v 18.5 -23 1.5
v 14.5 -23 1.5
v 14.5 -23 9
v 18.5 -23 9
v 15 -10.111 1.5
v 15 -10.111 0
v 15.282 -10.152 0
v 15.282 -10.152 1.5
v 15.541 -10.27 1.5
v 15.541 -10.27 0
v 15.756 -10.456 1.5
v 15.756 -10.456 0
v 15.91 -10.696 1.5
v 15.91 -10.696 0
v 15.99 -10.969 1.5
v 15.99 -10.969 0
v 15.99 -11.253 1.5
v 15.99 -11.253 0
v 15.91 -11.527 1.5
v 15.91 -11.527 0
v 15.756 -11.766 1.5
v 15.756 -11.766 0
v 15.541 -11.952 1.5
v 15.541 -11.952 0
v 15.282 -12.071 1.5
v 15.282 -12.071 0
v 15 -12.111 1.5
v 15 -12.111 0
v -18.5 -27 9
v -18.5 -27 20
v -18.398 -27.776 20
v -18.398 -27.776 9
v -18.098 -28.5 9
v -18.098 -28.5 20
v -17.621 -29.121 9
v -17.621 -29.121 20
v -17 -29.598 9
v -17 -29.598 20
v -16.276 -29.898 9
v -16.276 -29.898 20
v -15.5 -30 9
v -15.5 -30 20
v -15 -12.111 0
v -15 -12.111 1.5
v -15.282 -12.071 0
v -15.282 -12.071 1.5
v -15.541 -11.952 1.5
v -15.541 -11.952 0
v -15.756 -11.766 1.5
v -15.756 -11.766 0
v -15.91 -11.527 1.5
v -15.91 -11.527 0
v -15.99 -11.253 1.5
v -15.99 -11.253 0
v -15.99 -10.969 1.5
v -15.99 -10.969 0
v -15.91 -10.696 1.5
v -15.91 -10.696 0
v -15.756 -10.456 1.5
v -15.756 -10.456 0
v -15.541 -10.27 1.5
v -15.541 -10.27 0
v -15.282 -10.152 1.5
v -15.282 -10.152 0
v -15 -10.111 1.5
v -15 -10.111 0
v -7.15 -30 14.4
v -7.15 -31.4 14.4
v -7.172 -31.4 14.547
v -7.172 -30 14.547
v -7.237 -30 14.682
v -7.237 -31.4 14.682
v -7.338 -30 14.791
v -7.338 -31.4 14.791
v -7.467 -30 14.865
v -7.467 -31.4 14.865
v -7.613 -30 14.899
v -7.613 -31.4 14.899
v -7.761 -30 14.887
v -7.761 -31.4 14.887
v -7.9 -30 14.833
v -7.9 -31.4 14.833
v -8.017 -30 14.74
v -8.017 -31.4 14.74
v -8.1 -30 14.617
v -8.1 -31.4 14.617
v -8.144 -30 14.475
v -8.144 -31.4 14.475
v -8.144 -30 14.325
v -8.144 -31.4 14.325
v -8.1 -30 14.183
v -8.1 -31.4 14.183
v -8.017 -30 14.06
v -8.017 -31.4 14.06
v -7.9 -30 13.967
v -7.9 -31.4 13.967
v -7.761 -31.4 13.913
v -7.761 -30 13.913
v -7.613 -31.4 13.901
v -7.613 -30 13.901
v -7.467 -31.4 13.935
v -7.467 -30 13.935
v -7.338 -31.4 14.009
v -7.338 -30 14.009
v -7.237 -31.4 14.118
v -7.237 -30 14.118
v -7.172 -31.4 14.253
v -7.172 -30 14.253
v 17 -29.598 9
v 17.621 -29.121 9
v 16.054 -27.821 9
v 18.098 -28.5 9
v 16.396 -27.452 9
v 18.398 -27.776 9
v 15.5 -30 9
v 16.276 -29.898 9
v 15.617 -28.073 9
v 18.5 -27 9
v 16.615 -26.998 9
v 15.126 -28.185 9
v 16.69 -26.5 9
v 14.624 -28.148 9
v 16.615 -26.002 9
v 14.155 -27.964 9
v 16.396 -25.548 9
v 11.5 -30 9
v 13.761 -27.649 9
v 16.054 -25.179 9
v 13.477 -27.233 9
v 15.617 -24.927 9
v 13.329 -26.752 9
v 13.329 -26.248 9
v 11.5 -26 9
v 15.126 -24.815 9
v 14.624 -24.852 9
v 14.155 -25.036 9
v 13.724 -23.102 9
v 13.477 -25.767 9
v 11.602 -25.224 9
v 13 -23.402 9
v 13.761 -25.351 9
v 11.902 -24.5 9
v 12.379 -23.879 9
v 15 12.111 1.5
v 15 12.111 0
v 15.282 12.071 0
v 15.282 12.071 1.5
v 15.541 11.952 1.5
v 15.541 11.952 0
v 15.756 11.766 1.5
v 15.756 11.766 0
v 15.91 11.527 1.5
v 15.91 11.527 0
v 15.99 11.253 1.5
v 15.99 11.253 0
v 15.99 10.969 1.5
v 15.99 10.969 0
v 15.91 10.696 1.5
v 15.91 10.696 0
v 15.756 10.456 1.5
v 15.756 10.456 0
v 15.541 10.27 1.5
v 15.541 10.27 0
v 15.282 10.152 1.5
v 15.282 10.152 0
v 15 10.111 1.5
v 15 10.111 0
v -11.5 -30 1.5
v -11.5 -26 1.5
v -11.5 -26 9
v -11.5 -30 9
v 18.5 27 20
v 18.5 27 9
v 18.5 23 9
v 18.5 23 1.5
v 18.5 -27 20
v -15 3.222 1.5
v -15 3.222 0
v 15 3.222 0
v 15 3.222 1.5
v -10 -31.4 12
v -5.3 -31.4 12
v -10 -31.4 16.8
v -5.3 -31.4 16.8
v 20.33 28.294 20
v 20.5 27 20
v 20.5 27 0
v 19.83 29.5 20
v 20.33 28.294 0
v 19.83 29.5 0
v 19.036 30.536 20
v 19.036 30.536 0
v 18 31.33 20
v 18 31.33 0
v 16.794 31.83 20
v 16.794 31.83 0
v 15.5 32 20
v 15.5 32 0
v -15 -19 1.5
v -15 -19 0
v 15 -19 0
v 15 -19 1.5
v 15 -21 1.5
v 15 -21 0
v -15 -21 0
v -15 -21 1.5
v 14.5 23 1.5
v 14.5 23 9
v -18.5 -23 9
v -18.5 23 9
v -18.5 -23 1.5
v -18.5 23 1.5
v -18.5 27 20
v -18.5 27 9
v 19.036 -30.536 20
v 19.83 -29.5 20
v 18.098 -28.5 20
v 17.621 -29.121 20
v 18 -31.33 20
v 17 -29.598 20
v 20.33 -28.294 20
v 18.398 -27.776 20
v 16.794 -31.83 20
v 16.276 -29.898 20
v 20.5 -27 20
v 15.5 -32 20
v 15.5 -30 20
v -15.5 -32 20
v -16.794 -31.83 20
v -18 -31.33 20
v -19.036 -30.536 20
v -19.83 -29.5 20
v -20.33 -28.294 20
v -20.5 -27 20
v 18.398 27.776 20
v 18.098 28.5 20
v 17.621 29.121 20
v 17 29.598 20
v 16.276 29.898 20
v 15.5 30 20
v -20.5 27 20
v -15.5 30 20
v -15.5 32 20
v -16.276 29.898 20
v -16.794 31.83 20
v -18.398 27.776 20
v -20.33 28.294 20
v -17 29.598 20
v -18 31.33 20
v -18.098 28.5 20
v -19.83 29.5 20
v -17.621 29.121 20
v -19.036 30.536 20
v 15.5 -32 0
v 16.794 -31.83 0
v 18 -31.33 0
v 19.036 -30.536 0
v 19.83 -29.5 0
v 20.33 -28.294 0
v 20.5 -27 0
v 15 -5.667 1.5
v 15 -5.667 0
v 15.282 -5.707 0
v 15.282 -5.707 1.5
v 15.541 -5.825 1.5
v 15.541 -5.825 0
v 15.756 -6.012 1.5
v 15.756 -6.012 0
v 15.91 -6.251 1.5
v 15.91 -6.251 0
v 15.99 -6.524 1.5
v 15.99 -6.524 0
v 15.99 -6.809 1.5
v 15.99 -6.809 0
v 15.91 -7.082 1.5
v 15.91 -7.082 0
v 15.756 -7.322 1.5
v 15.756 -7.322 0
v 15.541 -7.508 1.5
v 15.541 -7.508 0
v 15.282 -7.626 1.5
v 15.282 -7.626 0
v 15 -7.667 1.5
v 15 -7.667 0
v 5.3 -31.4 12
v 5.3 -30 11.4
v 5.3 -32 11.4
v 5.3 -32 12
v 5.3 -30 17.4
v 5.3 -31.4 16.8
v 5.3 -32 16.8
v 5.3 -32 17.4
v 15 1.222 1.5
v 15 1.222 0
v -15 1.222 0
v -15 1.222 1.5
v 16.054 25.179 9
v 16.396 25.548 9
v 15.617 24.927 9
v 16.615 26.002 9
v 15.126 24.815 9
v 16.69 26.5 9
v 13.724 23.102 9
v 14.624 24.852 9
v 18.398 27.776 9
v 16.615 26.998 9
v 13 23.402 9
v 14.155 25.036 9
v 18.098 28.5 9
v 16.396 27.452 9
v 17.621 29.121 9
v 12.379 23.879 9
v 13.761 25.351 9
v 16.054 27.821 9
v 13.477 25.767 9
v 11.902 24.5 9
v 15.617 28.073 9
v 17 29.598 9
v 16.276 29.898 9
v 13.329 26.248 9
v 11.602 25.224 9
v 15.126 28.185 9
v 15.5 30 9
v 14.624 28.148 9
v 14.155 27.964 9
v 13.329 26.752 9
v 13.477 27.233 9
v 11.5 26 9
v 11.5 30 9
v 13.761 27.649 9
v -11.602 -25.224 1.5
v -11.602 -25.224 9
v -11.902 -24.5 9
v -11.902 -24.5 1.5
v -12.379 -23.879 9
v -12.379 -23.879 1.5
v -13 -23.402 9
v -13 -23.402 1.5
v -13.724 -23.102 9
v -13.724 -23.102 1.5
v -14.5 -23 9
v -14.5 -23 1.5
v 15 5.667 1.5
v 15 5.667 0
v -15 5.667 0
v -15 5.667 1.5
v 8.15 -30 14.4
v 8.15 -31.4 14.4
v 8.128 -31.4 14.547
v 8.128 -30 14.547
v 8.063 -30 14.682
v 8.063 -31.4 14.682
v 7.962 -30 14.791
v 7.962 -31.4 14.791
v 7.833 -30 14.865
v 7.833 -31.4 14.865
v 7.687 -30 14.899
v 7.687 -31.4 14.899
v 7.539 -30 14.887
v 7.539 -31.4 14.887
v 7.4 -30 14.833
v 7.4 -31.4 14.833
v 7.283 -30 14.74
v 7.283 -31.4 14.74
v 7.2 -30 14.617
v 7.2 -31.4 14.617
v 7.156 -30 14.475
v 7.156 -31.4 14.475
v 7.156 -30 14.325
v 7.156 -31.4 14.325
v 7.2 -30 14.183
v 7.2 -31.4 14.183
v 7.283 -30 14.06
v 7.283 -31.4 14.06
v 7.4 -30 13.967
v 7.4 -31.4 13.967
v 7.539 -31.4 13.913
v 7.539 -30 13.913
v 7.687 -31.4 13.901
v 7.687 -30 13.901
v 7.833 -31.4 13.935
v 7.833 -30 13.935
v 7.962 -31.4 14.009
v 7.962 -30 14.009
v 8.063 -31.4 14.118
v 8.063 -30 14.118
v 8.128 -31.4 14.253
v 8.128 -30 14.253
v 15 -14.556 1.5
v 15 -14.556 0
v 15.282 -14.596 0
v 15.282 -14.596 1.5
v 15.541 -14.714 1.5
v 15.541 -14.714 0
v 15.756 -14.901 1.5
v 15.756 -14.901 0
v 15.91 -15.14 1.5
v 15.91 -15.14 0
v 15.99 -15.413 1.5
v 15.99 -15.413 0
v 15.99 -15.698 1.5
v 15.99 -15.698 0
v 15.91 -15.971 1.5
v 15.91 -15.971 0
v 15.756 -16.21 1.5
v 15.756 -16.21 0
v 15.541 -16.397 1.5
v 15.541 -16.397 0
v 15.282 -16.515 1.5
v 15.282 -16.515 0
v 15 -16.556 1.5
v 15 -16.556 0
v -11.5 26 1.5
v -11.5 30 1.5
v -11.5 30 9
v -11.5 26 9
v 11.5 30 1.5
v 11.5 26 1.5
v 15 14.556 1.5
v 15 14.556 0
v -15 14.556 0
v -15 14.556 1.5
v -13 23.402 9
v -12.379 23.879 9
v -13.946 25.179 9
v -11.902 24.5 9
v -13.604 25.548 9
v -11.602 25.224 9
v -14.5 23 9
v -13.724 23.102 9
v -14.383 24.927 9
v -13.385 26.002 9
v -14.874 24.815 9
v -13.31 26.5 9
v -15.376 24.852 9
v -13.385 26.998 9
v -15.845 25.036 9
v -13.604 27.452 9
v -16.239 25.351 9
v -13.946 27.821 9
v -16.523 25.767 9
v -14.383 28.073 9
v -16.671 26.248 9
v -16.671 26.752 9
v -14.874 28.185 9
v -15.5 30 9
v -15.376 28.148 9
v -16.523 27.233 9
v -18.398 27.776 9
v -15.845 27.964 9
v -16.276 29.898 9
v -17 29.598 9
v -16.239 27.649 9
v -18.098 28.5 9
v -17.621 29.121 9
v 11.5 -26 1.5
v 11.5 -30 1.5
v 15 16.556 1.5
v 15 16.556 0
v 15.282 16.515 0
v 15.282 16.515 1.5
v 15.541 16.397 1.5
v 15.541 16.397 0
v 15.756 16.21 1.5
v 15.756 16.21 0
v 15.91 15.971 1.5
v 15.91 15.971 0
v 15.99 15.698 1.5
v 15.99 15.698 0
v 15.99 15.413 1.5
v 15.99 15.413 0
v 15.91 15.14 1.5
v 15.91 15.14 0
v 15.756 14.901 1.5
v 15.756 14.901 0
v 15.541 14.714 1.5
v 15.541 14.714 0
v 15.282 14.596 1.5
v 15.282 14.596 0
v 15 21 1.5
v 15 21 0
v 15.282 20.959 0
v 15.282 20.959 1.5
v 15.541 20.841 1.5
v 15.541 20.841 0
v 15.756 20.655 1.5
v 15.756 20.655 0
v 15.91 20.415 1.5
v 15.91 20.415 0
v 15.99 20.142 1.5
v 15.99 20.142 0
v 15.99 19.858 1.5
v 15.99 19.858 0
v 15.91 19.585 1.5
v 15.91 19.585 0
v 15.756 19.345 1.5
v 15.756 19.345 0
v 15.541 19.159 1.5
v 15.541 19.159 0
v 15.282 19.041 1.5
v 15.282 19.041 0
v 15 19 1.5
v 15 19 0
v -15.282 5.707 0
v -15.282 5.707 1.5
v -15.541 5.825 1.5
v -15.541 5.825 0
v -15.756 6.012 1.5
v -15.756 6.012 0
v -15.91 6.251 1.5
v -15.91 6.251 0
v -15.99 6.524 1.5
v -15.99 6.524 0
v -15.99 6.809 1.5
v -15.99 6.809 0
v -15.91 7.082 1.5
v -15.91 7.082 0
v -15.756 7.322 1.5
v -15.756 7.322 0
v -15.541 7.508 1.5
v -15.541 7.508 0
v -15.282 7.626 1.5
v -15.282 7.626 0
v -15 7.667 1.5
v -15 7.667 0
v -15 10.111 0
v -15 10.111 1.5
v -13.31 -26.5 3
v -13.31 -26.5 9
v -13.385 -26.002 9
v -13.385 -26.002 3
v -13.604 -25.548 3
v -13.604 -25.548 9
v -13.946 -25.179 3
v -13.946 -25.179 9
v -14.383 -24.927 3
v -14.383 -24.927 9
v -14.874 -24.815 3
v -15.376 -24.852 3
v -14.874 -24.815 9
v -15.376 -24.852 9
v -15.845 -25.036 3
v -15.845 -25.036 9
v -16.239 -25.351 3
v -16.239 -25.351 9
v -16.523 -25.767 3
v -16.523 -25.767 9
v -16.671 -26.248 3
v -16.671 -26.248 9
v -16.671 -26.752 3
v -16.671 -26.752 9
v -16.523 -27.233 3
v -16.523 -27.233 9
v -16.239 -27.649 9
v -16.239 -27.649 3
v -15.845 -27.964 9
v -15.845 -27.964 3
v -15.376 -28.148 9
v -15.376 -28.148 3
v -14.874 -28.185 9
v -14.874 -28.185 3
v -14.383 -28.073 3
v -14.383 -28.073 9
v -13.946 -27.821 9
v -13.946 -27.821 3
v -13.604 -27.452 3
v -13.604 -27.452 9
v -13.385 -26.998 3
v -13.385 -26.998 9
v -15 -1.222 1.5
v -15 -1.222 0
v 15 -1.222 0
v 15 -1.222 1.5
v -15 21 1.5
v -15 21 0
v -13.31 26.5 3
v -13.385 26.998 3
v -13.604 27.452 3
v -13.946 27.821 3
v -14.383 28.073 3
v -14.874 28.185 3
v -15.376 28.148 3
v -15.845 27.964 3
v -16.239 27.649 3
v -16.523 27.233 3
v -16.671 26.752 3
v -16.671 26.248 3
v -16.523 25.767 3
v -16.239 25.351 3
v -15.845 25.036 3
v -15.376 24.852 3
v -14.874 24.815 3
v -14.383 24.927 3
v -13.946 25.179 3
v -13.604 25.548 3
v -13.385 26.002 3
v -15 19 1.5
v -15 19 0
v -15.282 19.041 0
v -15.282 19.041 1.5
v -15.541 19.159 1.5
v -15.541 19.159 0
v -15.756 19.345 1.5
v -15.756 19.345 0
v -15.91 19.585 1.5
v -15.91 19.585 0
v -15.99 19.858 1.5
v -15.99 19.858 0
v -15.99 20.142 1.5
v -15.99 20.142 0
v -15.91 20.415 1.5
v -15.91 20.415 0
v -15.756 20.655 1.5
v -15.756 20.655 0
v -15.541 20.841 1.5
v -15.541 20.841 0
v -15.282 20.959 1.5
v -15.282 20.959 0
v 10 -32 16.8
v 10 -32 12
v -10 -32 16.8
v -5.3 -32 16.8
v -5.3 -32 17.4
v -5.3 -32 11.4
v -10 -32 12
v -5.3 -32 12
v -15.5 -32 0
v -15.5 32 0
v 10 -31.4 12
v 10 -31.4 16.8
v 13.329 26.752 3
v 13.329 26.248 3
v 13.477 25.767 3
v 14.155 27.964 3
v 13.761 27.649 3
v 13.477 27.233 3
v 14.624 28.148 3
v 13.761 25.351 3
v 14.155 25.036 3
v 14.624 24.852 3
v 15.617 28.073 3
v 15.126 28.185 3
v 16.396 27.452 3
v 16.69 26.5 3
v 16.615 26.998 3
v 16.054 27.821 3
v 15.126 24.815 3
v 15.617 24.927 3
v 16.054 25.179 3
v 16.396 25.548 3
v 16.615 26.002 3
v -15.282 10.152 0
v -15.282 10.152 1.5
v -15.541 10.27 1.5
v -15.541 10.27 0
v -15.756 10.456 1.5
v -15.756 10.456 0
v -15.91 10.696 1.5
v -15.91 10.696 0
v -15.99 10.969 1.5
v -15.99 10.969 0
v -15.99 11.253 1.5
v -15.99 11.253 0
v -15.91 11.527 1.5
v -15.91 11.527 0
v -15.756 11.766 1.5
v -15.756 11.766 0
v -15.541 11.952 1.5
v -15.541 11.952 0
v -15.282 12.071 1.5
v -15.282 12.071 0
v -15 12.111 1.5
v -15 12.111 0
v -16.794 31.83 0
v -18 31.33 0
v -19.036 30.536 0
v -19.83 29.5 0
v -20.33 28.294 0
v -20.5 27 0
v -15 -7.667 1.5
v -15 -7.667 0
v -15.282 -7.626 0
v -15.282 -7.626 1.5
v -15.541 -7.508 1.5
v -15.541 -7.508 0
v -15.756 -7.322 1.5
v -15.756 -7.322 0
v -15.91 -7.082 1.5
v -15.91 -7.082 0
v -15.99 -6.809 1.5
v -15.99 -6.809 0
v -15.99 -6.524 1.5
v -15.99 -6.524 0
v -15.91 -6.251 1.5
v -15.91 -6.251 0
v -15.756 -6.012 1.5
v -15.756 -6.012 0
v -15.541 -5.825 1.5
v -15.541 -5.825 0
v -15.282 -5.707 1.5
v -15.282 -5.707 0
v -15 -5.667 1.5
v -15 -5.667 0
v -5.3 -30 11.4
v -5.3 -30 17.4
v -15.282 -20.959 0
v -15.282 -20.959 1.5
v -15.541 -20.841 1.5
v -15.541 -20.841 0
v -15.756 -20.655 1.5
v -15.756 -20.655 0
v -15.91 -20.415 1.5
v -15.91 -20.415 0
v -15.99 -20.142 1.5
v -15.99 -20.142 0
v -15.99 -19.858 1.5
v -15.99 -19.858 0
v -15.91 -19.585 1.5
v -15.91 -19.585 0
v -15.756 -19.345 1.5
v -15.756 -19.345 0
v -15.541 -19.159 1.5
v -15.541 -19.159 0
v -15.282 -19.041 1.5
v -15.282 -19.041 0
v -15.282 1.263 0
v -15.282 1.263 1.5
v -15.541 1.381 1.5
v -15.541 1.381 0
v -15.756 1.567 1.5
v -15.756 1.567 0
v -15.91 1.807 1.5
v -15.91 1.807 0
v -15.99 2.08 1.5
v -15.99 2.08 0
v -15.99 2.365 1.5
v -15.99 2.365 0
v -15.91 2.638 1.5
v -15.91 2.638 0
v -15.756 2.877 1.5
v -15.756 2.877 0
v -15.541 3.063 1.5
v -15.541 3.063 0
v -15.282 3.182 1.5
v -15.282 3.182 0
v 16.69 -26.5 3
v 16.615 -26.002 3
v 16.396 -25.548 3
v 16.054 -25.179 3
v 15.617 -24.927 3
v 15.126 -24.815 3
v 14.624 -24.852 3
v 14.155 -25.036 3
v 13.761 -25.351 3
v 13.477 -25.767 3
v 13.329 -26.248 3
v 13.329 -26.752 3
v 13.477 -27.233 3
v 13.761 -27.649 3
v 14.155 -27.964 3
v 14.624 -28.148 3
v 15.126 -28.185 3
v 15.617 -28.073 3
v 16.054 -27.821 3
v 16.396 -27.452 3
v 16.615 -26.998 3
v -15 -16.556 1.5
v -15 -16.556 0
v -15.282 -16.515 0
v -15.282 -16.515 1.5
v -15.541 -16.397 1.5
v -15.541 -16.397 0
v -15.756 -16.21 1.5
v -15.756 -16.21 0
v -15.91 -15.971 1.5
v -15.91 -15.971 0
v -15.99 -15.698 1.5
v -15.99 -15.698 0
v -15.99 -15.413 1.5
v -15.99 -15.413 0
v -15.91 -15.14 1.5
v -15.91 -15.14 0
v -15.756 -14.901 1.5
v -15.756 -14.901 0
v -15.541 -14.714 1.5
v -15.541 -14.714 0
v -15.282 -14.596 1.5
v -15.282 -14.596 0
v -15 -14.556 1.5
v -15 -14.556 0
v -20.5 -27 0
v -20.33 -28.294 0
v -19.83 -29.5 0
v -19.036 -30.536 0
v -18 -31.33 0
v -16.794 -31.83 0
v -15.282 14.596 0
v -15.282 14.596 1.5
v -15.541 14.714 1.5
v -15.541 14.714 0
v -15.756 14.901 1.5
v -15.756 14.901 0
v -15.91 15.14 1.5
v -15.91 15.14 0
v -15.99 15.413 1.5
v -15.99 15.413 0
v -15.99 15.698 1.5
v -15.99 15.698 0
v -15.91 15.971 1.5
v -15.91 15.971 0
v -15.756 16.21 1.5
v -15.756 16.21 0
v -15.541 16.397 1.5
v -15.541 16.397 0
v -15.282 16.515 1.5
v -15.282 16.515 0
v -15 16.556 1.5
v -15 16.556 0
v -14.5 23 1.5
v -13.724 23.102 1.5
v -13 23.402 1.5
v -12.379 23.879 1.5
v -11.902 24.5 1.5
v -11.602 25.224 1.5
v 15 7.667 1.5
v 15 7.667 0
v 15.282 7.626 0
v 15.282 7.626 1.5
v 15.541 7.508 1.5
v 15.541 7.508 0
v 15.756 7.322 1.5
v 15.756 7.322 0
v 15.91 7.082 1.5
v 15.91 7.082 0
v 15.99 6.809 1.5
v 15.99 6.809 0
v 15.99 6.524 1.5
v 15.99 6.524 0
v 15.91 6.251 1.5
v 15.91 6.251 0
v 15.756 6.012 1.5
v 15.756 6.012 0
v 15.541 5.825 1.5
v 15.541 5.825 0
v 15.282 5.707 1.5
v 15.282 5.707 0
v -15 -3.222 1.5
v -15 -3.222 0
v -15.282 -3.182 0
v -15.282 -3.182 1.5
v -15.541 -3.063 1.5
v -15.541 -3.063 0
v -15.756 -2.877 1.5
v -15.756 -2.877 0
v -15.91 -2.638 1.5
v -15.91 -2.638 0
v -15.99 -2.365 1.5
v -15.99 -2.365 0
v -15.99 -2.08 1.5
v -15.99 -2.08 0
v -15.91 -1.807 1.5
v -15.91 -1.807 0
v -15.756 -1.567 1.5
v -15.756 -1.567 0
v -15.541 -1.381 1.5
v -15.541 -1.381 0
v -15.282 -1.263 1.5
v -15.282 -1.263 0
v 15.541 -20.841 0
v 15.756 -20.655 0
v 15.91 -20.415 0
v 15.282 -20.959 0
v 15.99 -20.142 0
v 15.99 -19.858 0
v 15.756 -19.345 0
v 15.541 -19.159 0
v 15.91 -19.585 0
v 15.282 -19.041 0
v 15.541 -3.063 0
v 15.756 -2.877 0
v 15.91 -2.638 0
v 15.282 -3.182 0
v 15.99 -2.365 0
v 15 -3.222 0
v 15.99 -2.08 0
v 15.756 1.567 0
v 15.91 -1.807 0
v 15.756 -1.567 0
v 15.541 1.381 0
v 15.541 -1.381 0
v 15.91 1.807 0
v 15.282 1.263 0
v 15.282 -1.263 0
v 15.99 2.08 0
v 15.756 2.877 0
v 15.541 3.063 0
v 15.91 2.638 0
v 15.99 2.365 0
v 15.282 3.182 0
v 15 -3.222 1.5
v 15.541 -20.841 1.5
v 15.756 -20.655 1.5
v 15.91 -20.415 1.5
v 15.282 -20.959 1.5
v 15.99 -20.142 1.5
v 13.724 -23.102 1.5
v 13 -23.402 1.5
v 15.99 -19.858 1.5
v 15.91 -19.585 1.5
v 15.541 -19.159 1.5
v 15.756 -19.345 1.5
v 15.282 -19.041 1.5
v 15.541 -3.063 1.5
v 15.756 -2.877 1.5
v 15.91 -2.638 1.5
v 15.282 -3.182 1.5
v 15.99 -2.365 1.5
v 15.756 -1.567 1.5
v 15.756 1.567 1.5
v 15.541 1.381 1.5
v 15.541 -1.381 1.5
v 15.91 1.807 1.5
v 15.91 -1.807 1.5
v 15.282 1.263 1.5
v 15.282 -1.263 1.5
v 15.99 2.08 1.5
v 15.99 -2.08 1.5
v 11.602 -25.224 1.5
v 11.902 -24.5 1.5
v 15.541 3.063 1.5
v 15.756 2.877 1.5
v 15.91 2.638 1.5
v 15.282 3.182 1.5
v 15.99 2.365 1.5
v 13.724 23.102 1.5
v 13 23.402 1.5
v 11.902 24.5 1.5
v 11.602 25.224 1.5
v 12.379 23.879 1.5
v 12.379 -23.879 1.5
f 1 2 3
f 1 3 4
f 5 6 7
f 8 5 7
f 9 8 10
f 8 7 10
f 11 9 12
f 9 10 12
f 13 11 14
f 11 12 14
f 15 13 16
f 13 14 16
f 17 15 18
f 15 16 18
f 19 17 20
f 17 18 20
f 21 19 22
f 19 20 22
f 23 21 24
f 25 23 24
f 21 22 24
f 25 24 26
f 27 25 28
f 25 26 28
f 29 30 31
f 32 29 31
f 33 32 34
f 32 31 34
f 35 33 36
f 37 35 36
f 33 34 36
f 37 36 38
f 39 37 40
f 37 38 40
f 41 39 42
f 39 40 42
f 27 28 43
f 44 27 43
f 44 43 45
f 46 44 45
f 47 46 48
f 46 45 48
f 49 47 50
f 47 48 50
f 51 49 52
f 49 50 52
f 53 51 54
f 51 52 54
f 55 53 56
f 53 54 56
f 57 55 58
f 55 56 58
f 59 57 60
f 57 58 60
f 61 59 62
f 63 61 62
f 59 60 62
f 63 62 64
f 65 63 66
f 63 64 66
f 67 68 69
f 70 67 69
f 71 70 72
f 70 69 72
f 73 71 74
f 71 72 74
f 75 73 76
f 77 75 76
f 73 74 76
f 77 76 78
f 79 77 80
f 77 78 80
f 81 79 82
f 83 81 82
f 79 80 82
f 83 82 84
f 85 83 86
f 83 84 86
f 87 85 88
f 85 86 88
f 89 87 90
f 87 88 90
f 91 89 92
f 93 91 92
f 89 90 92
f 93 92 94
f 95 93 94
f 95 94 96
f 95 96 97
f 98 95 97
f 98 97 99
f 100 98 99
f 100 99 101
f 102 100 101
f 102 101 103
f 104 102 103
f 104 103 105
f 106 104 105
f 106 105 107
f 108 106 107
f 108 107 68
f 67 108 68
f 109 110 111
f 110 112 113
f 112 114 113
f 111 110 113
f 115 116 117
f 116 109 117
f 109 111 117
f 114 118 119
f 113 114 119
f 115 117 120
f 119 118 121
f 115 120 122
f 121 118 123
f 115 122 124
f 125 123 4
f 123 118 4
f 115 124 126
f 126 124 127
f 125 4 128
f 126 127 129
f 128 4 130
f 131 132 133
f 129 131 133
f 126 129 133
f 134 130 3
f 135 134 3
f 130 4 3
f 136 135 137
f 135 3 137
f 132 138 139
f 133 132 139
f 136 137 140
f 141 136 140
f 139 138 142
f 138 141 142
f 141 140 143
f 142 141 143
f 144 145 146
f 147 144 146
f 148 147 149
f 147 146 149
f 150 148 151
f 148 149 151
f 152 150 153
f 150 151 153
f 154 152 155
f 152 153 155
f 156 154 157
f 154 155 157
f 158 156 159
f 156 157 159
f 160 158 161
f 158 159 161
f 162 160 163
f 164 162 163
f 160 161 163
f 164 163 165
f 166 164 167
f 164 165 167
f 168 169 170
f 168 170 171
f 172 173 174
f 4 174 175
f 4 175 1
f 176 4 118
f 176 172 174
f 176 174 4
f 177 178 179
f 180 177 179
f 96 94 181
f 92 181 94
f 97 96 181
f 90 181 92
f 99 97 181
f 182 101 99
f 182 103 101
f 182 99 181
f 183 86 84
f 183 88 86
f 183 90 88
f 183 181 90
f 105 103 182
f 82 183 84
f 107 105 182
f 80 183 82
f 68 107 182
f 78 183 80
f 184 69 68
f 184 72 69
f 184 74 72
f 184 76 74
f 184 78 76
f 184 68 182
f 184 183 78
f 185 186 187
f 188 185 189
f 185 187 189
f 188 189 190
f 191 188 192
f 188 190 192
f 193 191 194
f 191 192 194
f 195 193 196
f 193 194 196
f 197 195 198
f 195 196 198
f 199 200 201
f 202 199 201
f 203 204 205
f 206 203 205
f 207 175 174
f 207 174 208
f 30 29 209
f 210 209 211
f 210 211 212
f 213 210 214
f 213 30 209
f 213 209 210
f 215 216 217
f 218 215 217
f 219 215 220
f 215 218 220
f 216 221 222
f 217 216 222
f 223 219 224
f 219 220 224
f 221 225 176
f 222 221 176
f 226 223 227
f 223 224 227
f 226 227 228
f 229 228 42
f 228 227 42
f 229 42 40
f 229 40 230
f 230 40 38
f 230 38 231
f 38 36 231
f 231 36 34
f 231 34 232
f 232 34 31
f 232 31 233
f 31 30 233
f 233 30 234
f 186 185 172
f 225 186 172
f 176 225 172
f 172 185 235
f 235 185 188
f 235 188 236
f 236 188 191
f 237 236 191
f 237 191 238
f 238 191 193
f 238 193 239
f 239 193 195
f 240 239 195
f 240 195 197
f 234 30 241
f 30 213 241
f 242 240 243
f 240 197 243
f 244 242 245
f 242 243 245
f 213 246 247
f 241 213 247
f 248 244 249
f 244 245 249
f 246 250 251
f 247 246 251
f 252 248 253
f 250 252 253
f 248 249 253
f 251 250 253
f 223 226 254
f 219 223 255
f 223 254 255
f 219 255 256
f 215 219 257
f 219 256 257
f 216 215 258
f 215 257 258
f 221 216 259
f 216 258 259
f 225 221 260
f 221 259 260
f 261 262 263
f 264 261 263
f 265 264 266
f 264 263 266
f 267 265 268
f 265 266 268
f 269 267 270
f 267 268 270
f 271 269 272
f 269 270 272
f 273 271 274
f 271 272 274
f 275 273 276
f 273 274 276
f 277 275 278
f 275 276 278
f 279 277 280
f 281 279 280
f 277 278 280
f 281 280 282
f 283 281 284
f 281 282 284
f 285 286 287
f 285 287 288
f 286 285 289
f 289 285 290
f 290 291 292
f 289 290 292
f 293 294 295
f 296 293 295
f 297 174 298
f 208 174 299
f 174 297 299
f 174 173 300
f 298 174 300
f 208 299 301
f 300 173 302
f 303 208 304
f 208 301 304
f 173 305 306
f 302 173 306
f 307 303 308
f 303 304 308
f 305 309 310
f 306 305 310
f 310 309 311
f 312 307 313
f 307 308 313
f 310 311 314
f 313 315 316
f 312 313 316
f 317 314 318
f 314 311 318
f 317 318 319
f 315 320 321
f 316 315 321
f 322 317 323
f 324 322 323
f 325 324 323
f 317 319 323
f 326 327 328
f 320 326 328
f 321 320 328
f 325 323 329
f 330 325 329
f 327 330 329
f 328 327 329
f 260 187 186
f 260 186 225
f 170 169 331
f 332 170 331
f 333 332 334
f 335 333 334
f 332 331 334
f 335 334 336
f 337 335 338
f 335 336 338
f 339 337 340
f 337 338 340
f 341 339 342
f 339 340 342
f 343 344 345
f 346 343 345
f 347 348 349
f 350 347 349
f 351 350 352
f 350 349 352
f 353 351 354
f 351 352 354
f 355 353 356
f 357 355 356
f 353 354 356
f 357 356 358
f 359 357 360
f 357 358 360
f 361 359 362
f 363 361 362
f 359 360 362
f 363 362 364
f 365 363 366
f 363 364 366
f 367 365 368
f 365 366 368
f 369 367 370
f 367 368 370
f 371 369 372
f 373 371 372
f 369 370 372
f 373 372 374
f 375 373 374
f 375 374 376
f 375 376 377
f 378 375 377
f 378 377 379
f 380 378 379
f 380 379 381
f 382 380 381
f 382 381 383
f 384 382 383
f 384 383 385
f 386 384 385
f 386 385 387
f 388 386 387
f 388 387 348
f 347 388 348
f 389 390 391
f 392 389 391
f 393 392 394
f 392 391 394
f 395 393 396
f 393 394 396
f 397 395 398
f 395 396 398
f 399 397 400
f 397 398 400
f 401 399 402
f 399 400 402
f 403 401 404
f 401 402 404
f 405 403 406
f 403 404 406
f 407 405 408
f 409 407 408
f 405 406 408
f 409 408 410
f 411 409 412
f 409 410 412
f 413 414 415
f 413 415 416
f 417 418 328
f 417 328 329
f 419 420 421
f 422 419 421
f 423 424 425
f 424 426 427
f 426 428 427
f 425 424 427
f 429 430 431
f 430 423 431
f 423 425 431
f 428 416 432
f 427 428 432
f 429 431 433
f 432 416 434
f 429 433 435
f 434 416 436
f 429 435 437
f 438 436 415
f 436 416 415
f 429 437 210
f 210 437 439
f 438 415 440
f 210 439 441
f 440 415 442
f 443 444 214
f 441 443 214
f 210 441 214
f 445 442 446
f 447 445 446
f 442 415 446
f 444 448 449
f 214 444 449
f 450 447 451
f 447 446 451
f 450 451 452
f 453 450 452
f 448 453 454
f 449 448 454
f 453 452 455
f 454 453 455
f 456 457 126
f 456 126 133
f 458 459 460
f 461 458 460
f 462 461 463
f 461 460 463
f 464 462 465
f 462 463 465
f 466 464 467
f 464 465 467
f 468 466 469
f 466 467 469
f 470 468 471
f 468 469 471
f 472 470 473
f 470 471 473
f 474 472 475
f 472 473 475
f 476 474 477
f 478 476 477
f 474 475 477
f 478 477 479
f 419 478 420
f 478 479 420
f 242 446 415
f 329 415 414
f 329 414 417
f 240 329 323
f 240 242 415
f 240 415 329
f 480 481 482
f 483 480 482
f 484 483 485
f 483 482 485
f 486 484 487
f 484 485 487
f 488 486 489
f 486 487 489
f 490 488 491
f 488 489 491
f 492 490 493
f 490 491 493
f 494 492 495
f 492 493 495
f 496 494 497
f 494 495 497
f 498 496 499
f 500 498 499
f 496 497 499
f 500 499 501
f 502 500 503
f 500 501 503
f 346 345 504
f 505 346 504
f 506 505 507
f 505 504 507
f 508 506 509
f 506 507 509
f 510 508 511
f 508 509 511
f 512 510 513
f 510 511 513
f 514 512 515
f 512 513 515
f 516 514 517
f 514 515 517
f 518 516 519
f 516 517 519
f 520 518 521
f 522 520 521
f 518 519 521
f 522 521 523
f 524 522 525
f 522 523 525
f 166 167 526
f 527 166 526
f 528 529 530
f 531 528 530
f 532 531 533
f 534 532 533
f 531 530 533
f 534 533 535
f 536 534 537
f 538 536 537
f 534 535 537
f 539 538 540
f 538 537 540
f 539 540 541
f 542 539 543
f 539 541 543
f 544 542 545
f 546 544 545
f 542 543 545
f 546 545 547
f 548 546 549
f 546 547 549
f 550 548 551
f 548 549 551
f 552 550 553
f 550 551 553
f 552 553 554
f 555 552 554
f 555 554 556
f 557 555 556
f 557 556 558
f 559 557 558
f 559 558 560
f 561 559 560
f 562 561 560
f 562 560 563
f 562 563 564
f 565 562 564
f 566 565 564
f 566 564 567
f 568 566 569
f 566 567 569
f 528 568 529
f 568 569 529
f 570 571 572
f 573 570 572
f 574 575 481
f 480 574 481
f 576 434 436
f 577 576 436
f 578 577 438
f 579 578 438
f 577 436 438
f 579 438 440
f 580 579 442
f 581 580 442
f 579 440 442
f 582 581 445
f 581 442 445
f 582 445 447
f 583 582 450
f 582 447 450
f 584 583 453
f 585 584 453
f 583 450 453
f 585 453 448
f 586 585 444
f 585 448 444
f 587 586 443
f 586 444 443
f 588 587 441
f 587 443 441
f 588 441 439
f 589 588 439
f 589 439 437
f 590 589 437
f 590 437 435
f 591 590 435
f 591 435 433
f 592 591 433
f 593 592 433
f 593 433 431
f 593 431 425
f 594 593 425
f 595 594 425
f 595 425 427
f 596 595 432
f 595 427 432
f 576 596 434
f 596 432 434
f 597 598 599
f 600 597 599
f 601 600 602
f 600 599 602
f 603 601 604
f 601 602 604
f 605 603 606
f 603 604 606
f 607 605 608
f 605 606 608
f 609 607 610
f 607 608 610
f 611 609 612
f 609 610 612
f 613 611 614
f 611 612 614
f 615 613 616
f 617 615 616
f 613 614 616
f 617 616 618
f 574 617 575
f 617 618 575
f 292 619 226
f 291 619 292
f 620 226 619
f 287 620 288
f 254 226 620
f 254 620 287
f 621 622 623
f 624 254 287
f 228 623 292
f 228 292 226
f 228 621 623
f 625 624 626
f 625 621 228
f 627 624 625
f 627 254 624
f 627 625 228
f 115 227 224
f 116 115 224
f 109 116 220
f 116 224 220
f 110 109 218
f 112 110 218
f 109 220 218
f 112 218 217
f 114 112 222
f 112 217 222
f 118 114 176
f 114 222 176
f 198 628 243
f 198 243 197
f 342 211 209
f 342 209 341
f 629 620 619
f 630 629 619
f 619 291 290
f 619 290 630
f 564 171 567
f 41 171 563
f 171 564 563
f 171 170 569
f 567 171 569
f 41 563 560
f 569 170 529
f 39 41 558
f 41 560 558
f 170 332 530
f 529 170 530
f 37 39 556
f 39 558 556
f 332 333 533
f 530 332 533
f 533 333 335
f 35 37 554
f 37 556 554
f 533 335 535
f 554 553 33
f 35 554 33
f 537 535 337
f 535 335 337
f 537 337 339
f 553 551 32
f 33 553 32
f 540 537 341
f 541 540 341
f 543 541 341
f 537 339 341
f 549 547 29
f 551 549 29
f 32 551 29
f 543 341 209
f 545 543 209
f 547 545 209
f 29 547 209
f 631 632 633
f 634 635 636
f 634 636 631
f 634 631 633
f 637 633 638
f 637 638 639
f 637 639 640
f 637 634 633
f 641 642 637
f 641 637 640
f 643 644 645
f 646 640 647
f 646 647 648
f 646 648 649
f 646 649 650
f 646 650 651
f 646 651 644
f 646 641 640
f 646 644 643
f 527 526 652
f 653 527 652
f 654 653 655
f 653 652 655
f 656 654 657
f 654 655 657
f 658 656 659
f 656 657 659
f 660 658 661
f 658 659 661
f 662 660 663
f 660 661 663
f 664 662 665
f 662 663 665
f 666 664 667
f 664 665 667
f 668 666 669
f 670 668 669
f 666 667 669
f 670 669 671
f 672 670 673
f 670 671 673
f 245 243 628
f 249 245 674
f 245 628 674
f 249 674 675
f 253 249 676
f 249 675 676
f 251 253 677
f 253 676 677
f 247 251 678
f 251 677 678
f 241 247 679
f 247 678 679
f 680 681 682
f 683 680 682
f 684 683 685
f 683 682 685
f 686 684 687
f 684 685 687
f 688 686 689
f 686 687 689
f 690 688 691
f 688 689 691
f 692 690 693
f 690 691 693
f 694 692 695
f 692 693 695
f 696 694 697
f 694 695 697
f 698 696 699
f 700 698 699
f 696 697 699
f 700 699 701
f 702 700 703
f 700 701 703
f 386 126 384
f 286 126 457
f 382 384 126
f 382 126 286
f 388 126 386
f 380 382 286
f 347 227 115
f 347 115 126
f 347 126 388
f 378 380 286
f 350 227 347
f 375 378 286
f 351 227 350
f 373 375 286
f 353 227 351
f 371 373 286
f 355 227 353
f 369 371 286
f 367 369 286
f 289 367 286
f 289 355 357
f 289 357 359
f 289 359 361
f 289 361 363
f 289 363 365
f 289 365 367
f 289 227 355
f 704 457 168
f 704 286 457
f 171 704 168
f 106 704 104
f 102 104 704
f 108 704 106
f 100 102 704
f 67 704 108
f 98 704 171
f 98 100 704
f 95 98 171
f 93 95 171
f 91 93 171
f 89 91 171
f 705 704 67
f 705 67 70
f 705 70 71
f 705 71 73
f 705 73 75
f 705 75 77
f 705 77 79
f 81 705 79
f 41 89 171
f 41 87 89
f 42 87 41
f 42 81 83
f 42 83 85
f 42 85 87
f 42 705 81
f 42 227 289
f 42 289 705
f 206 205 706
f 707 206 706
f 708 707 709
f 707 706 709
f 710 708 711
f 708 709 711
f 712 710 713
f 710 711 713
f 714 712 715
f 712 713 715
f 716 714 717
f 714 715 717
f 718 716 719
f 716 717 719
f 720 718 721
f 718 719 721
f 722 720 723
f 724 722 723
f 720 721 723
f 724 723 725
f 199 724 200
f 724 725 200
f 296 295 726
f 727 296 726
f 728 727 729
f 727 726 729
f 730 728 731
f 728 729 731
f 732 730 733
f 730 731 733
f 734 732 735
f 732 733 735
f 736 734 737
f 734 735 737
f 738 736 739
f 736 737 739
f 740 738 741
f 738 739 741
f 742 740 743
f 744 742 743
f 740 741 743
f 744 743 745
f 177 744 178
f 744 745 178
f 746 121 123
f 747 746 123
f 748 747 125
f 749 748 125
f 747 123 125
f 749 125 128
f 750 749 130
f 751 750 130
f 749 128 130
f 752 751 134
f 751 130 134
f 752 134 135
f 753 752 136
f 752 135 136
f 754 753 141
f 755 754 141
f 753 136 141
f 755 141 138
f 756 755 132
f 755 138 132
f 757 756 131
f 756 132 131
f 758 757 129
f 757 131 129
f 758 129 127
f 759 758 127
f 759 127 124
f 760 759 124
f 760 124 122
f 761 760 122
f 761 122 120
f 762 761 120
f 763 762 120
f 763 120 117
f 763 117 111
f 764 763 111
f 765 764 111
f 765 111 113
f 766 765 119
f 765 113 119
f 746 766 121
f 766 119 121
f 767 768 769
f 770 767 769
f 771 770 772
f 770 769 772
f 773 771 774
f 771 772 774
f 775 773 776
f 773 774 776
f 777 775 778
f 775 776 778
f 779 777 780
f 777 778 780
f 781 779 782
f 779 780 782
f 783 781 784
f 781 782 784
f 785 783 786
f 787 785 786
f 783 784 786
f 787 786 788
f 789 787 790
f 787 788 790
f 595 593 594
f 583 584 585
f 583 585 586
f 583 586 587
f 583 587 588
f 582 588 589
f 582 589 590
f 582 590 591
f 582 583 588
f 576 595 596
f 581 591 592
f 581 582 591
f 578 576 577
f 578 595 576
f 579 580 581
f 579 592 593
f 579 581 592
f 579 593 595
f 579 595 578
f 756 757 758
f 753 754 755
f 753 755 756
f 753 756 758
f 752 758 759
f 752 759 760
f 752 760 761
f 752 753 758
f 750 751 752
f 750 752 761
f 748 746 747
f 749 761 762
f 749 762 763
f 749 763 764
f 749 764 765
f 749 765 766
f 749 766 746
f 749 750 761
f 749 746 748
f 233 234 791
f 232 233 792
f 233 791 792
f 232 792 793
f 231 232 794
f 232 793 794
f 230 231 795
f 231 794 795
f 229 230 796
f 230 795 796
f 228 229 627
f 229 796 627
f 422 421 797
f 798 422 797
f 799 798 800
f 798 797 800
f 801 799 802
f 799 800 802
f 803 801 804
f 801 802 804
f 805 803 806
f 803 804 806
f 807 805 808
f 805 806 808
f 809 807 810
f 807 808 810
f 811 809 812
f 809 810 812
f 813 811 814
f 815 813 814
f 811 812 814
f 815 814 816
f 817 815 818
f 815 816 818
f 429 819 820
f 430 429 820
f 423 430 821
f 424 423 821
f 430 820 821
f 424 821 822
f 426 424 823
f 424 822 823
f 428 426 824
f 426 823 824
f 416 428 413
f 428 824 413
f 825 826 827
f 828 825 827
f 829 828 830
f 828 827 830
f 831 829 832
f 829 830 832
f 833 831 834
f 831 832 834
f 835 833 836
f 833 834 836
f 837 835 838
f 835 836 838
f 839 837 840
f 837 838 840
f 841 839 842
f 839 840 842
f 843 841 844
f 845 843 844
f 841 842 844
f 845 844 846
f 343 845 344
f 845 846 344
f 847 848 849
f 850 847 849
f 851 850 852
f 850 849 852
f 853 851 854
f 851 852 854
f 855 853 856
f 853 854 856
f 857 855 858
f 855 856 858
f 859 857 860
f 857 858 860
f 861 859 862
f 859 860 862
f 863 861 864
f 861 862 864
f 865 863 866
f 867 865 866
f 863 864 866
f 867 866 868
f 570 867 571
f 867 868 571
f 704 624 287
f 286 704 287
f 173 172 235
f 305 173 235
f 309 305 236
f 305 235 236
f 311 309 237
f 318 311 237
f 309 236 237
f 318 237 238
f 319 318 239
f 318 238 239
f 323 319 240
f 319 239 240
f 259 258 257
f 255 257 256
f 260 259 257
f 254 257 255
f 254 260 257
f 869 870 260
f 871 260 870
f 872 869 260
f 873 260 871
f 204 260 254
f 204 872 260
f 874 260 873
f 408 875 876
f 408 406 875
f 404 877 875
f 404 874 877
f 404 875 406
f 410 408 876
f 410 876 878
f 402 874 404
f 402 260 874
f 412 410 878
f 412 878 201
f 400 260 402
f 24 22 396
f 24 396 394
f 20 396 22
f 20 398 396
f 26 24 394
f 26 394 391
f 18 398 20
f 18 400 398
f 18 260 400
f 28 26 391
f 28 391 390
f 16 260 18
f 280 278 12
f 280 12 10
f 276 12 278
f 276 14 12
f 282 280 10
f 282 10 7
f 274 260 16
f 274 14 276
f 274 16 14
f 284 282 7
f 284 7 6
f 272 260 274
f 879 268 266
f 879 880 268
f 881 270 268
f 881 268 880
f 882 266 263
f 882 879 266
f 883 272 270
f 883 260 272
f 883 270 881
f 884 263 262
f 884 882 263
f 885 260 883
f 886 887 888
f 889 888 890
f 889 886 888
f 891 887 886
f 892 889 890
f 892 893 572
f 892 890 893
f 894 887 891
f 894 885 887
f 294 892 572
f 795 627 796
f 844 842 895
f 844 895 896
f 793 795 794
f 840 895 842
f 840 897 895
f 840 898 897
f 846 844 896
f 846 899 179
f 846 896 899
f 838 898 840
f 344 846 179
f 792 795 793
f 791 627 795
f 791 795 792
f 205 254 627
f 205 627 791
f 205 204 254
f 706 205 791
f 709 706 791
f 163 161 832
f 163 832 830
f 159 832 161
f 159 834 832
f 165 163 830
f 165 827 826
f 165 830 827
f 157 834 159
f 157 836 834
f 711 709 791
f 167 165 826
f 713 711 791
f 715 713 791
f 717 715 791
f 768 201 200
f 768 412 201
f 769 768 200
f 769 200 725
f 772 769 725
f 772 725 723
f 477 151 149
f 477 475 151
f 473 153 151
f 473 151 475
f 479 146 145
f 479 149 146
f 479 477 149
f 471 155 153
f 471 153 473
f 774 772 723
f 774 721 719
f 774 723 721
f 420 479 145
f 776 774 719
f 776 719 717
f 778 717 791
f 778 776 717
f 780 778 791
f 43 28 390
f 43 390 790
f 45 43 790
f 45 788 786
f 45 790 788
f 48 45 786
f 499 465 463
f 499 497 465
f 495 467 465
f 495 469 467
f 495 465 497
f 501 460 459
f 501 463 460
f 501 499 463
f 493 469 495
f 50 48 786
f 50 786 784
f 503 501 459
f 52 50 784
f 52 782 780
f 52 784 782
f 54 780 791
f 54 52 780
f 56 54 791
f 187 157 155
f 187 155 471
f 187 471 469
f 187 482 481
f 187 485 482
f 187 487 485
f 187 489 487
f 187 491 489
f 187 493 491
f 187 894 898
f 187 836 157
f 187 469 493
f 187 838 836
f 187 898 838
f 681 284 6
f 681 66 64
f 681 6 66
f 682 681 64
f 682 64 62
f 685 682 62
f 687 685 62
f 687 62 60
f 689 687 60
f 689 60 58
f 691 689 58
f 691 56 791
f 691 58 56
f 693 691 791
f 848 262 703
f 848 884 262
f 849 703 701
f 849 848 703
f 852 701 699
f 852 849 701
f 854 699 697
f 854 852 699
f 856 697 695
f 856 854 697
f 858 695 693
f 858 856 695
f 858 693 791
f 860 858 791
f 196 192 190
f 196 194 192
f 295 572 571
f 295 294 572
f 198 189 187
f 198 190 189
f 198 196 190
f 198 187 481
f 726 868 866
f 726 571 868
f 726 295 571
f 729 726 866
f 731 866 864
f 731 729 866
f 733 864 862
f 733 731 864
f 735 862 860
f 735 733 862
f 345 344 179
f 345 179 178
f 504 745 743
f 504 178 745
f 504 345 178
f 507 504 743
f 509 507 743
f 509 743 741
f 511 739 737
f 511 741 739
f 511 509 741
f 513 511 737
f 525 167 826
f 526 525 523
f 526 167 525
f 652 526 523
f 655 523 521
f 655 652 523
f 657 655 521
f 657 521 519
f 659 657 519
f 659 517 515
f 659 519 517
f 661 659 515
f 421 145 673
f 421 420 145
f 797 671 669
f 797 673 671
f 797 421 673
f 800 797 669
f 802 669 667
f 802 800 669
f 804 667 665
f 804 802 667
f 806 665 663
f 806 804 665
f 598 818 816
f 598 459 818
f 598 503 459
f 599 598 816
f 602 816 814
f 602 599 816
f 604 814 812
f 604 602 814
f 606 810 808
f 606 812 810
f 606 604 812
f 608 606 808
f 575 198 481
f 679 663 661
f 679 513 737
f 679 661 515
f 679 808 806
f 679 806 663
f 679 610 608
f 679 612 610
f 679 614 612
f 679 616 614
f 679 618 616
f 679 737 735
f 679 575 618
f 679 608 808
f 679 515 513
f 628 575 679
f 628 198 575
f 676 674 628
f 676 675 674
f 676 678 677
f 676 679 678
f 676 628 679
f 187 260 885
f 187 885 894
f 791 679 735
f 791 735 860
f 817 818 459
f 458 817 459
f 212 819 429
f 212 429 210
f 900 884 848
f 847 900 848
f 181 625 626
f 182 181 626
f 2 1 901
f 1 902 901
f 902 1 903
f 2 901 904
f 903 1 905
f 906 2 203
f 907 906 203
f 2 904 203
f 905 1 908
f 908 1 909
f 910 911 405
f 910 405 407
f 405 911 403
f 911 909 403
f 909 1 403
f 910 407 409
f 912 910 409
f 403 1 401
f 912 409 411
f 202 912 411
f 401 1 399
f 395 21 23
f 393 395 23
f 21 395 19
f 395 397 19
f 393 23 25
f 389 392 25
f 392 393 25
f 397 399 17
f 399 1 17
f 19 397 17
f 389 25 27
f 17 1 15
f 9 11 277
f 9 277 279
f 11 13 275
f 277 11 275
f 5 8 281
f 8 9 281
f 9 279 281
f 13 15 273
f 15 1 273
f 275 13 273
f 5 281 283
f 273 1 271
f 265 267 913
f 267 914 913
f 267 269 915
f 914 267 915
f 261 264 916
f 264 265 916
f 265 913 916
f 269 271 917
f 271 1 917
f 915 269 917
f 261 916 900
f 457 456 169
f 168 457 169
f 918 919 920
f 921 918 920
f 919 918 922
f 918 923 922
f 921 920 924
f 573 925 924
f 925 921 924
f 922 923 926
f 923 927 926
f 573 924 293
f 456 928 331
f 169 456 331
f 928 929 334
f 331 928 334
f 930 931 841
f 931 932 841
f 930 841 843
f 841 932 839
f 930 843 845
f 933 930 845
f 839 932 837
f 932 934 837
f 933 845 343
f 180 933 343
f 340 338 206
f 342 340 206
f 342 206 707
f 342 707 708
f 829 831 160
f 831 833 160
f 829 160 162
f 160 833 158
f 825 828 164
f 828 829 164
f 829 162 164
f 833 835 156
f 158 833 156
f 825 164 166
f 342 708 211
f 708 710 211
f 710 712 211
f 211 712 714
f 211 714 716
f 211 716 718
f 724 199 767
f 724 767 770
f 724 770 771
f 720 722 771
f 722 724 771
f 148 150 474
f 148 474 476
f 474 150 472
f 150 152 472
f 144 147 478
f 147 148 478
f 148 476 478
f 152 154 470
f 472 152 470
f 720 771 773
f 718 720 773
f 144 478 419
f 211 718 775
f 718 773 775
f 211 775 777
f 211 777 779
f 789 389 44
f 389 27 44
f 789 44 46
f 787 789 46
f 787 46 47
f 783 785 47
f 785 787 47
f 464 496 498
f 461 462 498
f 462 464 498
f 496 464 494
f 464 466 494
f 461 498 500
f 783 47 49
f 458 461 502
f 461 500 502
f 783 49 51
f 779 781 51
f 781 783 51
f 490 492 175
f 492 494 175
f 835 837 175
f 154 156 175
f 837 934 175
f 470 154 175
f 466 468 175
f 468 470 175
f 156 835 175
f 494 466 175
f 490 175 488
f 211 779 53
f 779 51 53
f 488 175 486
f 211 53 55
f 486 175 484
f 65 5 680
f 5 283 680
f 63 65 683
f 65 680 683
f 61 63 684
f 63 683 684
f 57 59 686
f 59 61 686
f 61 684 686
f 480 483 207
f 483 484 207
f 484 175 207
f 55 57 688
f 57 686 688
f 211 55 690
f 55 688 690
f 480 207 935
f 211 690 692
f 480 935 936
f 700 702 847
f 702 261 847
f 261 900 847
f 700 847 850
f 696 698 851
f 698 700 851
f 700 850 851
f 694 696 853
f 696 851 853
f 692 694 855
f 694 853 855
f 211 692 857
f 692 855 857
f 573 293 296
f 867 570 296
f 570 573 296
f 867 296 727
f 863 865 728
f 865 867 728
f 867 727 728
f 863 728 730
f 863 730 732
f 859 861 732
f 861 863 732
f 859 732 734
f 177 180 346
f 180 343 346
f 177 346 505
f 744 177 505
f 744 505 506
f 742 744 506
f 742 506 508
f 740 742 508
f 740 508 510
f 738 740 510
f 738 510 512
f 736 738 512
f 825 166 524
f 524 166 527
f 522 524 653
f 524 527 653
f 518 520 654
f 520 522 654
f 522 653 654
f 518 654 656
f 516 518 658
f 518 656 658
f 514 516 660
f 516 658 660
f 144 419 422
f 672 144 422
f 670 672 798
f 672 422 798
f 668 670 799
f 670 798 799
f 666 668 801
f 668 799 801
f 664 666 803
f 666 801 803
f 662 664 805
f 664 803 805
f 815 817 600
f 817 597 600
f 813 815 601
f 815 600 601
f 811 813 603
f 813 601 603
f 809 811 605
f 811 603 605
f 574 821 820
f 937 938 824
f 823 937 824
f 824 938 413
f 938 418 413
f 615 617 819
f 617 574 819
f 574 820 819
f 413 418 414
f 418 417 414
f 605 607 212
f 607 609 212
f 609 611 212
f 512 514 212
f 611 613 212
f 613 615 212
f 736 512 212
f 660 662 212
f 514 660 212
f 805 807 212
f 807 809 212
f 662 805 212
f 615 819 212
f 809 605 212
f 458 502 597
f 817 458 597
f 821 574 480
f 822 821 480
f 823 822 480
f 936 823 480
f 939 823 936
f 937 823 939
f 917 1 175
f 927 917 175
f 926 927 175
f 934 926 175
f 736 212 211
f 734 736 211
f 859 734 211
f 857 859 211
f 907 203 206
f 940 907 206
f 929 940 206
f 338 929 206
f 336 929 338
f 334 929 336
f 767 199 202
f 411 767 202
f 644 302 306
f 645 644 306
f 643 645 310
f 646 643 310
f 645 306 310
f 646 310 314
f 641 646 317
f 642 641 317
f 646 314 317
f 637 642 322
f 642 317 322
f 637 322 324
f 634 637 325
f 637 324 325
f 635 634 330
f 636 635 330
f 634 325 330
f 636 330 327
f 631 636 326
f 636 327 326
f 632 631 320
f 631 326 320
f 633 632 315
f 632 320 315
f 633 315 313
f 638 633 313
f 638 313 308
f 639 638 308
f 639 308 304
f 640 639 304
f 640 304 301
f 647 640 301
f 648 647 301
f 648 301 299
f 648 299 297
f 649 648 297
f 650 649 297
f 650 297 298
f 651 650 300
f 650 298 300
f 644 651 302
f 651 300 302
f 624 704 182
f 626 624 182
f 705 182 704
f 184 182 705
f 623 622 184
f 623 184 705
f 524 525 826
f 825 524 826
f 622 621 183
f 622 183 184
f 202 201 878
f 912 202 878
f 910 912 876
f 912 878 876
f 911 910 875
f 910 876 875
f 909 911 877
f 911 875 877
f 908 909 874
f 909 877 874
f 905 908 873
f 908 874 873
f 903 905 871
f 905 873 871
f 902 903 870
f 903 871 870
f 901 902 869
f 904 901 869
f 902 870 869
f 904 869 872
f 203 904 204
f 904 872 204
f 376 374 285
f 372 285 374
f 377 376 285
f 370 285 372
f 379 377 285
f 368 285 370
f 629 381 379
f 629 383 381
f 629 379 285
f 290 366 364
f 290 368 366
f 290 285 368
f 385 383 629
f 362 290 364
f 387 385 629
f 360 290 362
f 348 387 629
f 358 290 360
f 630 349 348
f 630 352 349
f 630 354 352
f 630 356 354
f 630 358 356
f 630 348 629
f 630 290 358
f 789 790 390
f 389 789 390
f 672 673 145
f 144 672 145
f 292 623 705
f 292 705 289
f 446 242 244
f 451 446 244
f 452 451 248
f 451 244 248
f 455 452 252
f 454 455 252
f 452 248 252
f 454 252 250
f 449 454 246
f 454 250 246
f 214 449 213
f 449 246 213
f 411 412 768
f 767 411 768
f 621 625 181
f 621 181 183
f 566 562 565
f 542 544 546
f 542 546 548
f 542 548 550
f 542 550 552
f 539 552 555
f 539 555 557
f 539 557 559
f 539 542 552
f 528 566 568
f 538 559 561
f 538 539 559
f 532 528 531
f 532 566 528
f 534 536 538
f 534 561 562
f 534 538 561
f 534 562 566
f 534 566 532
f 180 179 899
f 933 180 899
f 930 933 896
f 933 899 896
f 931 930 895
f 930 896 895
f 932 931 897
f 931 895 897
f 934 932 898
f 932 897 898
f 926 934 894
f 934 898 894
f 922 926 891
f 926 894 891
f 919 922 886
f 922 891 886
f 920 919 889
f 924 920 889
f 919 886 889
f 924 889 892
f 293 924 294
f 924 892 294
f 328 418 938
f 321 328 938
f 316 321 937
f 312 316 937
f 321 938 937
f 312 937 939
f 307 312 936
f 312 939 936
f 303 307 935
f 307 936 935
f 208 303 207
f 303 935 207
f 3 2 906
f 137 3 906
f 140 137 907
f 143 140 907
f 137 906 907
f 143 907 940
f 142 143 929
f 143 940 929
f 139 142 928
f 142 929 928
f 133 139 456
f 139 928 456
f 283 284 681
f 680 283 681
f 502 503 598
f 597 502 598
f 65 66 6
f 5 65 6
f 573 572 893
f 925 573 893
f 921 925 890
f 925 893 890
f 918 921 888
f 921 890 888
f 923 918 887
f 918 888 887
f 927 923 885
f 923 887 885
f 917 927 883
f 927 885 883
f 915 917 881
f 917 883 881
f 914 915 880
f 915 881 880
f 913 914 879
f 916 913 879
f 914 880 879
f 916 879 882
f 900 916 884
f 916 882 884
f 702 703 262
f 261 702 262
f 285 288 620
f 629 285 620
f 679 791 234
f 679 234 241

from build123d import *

# Parameters (mm, degrees)
PAD_DEPTH           = 20
POCKET_DEPTH        = 18.5
POCKET001_DEPTH     = 5
LINEARPATTERN_COUNT = 10
LINEARPATTERN_PITCH = 4.444444
PAD001_DEPTH        = 7.5
SKETCH004_R         = 1.69
POCKET002_DEPTH     = 6
SKETCH005_W         = 20
SKETCH005_H         = 4.8
POCKET003_DEPTH     = 0.6
SKETCH006_R         = 0.5
SKETCH006_W         = 10.6
SKETCH006_H         = 6
POCKET004_DEPTH     = 5


with BuildPart() as part:
    # Sketch → Pad (new body)
    with BuildSketch(Plane.XY):
        with BuildLine():
            Line((-15.5, 32), (15.5, 32))
            ThreePointArc((20.5, 27), (19.035534, 30.535534), (15.5, 32))
            Line((20.5, 27), (20.5, -27))
            ThreePointArc((15.5, -32), (19.035534, -30.535534), (20.5, -27))
            Line((15.5, -32), (-15.5, -32))
            ThreePointArc((-20.5, -27), (-19.035534, -30.535534), (-15.5, -32))
            Line((-20.5, -27), (-20.5, 27))
            ThreePointArc((-15.5, 32), (-19.035534, 30.535534), (-20.5, 27))
        make_face()
    extrude(amount=PAD_DEPTH)

    # Sketch001 (on Face10 of Pad) → Pocket (cut)
    with BuildSketch(Plane.XY.offset(20)):
        with BuildLine():
            Line((-15.5, 30), (15.5, 30))
            ThreePointArc((18.5, 27), (17.62132, 29.12132), (15.5, 30))
            Line((18.5, 27), (18.5, -27))
            ThreePointArc((15.5, -30), (17.62132, -29.12132), (18.5, -27))
            Line((15.5, -30), (-15.5, -30))
            ThreePointArc((-18.5, -27), (-17.62132, -29.12132), (-15.5, -30))
            Line((-18.5, -27), (-18.5, 27))
            ThreePointArc((-15.5, 30), (-17.62132, 29.12132), (-18.5, 27))
        make_face()
    extrude(amount=-POCKET_DEPTH, mode=Mode.SUBTRACT)

    # Sketch002 (on Face4 of Pocket) → Pocket001 (cut)
    with BuildSketch(Plane(origin=(0, 0, 0), x_dir=(1, 0, 0), z_dir=(0, 0, -1))):
        with BuildLine():
            ThreePointArc((-15, 21), (-16, 20), (-15, 19))
            Line((-15, 19), (15, 19))
            ThreePointArc((15, 19), (16, 20), (15, 21))
            Line((15, 21), (-15, 21))
        make_face()
    pocket001 = extrude(amount=-POCKET001_DEPTH, mode=Mode.SUBTRACT)

    # LinearPattern: Pocket001 ×10
    with Locations(*[(0, i * LINEARPATTERN_PITCH, 0) for i in range(1, LINEARPATTERN_COUNT)]):
        add(pocket001, mode=Mode.SUBTRACT)

    # Sketch003 (on Face59 of LinearPattern) → Pad001 (join)
    with BuildSketch(Plane.XY.offset(1.5)):
        with BuildLine():
            Line((-15.5, 30), (-11.5, 30))
            Line((-11.5, 30), (-11.5, 26))
            ThreePointArc((-14.5, 23), (-12.37868, 23.87868), (-11.5, 26))
            Line((-14.5, 23), (-18.5, 23))
            Line((-18.5, 23), (-18.5, 27))
            ThreePointArc((-15.5, 30), (-17.62132, 29.12132), (-18.5, 27))
        make_face()
        with BuildLine():
            Line((11.5, 30), (15.5, 30))
            ThreePointArc((18.5, 27), (17.62132, 29.12132), (15.5, 30))
            Line((18.5, 27), (18.5, 23))
            Line((18.5, 23), (14.5, 23))
            ThreePointArc((11.5, 26), (12.37868, 23.87868), (14.5, 23))
            Line((11.5, 26), (11.5, 30))
        make_face()
        with BuildLine():
            Line((-18.5, -23), (-14.5, -23))
            ThreePointArc((-11.5, -26), (-12.37868, -23.87868), (-14.5, -23))
            Line((-11.5, -26), (-11.5, -30))
            Line((-11.5, -30), (-15.5, -30))
            ThreePointArc((-18.5, -27), (-17.62132, -29.12132), (-15.5, -30))
            Line((-18.5, -27), (-18.5, -23))
        make_face()
        with BuildLine():
            Line((14.5, -23), (18.5, -23))
            Line((18.5, -23), (18.5, -27))
            ThreePointArc((15.5, -30), (17.62132, -29.12132), (18.5, -27))
            Line((15.5, -30), (11.5, -30))
            Line((11.5, -30), (11.5, -26))
            ThreePointArc((14.5, -23), (12.37868, -23.87868), (11.5, -26))
        make_face()
    extrude(amount=PAD001_DEPTH)

    # Sketch004 (on Face69 of Pad001) → Pocket002 (cut)
    with BuildSketch(Plane.XY.offset(9)):
        with Locations((15, 26.5)):
            Circle(SKETCH004_R)
        with Locations((-15, 26.5)):
            Circle(SKETCH004_R)
        with Locations((-15, -26.5)):
            Circle(SKETCH004_R)
        with Locations((15, -26.5)):
            Circle(SKETCH004_R)
    extrude(amount=-POCKET002_DEPTH, mode=Mode.SUBTRACT)

    # Sketch005 (on Face6 of Pocket002) → Pocket003 (cut)
    with BuildSketch(Plane.XZ.offset(32)):
        with Locations((0, 14.4)):
            Rectangle(SKETCH005_W, SKETCH005_H)
    extrude(amount=-POCKET003_DEPTH, mode=Mode.SUBTRACT)

    # Sketch006 (on Face6 of Pocket003) → Pocket004 (cut)
    with BuildSketch(Plane.XZ.offset(32)):
        with Locations((7.65, 14.4)):
            Circle(SKETCH006_R)
        with Locations((-7.65, 14.4)):
            Circle(SKETCH006_R)
        with Locations((0, 14.4)):
            Rectangle(SKETCH006_W, SKETCH006_H)
    extrude(amount=-POCKET004_DEPTH, mode=Mode.SUBTRACT)


solid = part.part
